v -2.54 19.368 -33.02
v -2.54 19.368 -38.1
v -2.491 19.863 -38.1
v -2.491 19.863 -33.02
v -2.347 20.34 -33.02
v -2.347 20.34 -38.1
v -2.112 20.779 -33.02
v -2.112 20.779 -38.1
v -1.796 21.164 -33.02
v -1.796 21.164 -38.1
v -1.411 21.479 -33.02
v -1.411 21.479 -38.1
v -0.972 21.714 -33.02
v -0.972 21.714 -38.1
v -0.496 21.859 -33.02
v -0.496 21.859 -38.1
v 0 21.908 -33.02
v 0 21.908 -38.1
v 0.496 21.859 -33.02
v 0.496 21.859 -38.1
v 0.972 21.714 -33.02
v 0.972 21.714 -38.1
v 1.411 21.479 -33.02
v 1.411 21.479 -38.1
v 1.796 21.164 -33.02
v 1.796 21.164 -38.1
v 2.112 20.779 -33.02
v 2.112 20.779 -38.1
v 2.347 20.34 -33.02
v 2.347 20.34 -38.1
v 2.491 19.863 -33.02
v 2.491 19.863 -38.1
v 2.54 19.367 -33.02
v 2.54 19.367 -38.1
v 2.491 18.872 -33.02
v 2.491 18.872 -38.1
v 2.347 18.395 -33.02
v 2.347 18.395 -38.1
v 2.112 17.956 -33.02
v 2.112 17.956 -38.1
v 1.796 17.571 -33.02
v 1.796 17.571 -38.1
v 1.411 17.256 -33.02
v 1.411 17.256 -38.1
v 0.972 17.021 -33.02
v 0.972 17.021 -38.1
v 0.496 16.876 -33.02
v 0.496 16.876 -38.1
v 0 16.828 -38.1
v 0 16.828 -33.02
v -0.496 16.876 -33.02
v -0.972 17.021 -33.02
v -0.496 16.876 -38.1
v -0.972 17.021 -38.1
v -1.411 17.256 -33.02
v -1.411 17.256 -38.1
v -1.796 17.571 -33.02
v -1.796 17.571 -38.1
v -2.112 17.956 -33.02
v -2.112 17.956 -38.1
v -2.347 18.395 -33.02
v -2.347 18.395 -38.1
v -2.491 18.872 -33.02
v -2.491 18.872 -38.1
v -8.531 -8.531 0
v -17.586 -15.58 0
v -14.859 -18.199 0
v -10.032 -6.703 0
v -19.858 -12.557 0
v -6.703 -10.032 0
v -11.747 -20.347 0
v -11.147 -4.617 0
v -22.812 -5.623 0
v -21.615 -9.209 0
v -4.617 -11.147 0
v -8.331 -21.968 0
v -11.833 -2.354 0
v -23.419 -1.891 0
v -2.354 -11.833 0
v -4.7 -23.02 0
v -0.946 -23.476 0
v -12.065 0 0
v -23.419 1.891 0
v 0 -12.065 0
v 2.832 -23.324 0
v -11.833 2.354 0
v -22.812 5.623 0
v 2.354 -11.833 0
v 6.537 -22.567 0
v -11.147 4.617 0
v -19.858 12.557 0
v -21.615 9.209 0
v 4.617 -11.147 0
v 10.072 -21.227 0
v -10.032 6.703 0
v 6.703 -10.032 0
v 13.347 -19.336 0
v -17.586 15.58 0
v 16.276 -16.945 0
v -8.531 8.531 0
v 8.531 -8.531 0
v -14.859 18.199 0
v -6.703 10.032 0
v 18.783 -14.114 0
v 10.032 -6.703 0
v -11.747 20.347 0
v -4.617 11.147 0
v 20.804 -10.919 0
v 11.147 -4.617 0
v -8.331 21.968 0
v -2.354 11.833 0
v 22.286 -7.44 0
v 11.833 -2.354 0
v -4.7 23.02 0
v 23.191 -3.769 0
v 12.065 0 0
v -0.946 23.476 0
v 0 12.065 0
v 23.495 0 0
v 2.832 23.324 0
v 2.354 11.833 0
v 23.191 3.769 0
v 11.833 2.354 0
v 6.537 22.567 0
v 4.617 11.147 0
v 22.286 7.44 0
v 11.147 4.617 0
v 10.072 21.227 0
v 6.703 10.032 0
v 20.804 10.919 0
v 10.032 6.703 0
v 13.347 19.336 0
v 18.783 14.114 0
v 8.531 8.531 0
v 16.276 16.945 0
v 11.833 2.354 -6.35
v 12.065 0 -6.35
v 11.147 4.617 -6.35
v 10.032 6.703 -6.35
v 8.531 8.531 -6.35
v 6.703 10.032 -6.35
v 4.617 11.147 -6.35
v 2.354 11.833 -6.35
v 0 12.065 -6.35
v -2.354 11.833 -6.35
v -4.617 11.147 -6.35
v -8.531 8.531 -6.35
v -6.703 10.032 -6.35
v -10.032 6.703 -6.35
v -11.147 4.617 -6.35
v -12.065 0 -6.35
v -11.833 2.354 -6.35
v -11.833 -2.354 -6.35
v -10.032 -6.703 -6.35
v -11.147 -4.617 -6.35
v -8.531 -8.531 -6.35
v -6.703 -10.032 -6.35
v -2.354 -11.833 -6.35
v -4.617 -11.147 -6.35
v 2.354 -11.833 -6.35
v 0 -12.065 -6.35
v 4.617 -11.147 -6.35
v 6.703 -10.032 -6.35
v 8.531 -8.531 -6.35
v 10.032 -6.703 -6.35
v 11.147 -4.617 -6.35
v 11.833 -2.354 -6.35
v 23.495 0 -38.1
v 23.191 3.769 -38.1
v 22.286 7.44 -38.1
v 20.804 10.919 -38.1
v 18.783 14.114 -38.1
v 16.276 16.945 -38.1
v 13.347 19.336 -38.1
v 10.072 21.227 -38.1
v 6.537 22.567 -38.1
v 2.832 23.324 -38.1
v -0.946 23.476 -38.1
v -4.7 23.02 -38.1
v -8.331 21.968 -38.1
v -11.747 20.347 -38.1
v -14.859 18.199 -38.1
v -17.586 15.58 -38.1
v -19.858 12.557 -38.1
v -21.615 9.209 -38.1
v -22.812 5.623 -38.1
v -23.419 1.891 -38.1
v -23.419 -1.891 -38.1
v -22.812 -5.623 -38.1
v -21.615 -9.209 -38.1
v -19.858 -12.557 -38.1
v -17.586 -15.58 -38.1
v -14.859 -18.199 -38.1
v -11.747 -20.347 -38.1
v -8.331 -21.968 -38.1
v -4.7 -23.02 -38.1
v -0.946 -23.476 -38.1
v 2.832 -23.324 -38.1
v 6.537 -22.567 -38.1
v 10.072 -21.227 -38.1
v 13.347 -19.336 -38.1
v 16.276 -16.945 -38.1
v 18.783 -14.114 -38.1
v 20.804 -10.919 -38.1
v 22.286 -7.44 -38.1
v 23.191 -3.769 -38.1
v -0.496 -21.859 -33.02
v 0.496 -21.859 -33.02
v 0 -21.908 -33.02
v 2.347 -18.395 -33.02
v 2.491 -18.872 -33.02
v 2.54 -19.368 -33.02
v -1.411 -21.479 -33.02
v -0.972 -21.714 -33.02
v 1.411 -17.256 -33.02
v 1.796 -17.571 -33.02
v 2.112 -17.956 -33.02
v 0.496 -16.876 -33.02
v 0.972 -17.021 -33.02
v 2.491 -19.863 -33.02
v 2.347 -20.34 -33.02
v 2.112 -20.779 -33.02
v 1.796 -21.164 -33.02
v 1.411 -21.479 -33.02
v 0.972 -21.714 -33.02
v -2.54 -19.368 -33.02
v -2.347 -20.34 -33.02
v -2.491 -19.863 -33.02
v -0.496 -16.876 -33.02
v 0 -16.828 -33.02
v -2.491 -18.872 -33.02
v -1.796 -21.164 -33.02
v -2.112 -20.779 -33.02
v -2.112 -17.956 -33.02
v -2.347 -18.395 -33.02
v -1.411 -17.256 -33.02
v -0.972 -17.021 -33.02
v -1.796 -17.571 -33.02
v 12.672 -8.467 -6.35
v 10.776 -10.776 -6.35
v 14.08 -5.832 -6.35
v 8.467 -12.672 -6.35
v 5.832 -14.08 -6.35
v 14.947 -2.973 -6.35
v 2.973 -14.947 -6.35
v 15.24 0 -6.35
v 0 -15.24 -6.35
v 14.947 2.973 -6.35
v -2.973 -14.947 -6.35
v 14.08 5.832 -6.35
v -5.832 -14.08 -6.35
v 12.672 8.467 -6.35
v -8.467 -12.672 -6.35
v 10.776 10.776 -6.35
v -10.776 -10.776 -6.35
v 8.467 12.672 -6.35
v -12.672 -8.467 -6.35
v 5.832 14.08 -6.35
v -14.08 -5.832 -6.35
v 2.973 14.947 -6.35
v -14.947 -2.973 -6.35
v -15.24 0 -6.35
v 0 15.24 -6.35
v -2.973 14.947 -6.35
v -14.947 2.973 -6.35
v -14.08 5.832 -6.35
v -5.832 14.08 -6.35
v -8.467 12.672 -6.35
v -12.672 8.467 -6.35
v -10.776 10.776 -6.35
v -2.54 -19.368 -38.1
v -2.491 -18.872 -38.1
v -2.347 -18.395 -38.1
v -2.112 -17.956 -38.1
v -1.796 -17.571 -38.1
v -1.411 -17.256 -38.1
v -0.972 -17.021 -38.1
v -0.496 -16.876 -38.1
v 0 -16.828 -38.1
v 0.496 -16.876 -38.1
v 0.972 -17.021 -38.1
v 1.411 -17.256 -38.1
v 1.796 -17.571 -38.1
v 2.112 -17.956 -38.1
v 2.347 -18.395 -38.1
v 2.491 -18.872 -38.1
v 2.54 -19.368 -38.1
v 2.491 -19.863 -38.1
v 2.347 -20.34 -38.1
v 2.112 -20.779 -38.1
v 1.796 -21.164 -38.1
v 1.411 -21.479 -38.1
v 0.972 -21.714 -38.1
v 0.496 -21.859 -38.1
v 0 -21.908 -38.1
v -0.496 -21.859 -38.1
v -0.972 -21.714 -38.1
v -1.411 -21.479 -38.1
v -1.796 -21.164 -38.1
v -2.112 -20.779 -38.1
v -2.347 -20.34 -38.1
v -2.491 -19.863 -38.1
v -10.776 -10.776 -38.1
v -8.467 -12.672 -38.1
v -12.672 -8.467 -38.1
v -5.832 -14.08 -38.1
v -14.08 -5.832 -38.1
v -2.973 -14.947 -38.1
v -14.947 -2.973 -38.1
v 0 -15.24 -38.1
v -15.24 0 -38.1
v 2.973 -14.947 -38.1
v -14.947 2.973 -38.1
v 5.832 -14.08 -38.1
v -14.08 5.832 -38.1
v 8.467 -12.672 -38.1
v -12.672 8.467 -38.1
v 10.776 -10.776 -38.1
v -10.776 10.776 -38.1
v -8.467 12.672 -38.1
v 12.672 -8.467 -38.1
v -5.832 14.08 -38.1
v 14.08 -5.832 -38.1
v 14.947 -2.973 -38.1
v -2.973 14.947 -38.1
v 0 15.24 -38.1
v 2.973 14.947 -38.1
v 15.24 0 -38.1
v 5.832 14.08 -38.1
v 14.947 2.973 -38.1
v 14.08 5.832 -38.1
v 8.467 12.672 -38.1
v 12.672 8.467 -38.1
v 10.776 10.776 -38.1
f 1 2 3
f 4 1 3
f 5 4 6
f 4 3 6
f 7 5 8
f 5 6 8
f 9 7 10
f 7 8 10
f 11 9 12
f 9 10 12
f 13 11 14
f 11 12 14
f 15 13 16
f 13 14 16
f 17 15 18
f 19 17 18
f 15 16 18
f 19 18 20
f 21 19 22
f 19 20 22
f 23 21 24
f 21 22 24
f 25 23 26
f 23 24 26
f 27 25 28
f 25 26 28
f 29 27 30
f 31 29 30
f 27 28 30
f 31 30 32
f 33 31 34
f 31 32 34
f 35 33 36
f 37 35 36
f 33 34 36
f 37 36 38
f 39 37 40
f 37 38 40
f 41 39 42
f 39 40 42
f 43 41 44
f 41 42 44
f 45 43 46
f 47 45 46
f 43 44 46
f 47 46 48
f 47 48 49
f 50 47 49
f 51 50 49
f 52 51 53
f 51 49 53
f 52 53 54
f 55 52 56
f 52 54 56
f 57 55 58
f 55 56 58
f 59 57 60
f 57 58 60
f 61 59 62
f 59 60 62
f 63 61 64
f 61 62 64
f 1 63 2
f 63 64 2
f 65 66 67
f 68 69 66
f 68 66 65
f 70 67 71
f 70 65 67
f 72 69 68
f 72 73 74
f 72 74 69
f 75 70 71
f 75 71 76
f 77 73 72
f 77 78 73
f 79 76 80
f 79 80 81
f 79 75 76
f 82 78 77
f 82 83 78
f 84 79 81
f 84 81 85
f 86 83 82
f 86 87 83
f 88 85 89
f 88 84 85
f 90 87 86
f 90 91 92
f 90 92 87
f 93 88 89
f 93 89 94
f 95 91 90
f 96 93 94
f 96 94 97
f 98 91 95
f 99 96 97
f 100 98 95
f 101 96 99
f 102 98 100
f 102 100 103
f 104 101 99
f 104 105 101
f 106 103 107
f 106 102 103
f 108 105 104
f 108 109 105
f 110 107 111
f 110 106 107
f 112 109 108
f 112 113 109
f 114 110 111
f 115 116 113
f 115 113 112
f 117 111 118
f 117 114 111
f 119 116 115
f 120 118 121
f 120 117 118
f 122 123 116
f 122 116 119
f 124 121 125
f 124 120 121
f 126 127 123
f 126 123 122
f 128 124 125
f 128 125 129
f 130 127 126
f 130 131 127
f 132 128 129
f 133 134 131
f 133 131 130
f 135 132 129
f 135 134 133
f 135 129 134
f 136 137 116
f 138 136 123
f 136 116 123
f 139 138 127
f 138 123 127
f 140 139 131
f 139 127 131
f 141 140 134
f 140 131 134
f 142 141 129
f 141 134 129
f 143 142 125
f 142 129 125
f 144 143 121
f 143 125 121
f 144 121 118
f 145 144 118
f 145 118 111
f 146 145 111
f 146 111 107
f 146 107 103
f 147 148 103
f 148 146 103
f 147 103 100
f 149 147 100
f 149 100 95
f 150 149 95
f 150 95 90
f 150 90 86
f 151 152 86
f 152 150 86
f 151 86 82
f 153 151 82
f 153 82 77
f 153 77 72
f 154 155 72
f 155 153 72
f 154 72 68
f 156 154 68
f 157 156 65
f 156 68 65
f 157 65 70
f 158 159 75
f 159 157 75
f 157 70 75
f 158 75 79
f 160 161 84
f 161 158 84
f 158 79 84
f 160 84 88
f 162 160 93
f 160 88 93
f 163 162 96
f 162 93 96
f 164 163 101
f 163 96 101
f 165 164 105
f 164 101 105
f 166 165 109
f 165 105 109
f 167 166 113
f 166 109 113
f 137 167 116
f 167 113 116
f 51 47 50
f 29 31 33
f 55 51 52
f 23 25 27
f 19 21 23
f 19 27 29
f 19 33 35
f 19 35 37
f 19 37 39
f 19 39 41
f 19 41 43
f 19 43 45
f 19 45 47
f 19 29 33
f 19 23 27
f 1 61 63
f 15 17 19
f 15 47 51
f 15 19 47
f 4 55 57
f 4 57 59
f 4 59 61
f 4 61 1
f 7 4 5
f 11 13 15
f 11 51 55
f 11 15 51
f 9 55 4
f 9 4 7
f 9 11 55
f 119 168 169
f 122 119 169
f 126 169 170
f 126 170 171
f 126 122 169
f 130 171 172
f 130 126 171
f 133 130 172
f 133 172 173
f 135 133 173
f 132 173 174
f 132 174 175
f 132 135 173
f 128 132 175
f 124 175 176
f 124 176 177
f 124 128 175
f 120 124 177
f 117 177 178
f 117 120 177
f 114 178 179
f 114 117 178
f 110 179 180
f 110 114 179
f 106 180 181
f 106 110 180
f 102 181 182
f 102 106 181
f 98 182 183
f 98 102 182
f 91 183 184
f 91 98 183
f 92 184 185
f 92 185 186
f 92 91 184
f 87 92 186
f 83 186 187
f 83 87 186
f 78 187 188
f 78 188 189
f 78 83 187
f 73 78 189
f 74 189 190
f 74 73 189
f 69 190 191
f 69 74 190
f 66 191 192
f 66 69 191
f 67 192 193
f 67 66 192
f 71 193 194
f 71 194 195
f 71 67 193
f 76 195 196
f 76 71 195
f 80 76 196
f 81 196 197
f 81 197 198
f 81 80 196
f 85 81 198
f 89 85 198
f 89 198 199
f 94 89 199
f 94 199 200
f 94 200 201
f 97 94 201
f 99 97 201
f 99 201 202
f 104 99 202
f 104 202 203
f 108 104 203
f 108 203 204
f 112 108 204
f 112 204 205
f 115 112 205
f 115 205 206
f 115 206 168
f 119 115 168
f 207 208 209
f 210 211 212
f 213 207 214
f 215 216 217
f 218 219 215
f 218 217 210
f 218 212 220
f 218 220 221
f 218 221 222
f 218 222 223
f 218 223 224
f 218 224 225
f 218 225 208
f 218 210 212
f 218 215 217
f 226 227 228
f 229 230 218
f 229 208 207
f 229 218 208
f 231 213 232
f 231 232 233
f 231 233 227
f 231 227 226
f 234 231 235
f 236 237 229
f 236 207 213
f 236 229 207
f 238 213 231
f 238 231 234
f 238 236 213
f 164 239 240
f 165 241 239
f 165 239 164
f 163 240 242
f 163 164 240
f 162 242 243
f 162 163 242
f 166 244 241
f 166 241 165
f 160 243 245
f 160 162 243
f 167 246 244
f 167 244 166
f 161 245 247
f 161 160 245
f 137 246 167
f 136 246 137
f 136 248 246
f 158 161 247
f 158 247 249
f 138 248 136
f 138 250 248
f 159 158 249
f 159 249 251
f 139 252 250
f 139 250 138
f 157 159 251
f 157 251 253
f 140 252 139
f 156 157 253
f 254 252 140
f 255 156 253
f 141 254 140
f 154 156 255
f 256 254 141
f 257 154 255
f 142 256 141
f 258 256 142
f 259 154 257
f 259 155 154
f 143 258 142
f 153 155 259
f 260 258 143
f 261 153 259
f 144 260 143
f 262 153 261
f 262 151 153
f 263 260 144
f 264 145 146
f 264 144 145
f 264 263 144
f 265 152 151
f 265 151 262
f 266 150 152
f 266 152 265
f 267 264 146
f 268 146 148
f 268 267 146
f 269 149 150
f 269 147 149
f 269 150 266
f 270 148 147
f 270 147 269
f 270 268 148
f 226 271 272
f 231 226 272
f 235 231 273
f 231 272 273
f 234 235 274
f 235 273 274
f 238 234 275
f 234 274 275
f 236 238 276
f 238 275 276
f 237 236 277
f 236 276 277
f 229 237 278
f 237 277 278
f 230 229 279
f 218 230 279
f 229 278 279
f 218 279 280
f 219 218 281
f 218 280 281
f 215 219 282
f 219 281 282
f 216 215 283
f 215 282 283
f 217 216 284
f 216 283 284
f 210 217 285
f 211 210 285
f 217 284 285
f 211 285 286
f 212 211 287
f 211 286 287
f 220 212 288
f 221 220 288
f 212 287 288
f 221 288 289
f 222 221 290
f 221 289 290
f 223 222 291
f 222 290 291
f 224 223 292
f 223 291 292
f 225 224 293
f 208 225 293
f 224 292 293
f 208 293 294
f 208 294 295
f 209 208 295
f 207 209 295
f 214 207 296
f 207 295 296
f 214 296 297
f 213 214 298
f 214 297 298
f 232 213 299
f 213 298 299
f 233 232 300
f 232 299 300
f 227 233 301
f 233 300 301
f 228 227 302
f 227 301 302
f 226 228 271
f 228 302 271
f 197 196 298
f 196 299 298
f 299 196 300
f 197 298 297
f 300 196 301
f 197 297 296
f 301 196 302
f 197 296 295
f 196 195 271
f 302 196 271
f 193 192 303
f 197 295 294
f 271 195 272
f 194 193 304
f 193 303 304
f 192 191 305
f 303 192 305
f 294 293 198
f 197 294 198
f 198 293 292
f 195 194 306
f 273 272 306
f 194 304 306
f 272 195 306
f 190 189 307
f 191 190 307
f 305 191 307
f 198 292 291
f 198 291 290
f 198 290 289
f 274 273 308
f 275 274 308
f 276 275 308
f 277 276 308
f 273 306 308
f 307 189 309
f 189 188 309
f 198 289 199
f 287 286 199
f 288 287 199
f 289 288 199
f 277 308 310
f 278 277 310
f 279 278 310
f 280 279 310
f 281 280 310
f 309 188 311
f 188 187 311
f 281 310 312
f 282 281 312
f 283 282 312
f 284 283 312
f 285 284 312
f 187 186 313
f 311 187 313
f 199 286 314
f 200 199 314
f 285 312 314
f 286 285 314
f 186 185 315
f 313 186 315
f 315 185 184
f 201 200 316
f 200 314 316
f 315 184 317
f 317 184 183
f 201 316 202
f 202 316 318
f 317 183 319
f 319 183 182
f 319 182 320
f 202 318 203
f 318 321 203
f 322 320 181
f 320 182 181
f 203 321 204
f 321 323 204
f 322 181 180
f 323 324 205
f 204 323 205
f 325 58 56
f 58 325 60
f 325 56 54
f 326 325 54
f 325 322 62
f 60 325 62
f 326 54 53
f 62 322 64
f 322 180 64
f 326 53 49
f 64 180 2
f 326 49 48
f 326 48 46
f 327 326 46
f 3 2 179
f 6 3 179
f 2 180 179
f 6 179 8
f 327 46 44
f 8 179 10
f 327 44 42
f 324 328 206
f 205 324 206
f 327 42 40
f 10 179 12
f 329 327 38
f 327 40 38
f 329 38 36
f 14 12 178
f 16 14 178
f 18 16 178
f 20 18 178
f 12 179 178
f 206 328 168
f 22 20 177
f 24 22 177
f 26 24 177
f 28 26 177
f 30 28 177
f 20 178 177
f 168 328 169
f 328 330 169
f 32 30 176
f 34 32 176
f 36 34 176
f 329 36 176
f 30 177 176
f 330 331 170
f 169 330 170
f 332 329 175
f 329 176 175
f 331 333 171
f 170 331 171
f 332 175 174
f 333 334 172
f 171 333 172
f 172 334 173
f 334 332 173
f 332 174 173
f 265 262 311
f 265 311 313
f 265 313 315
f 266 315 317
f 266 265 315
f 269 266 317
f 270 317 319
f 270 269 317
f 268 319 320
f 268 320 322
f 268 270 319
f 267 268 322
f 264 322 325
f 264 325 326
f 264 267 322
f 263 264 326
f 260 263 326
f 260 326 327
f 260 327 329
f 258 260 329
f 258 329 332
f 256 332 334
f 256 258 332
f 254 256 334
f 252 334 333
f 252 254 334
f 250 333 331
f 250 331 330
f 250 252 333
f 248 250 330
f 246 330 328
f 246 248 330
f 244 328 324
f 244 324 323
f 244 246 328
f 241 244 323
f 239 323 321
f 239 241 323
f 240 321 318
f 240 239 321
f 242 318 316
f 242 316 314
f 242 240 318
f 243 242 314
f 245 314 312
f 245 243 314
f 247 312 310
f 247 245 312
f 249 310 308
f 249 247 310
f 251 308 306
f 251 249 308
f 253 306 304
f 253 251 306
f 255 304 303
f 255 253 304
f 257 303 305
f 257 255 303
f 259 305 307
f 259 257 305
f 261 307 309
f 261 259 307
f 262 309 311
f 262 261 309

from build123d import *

# Parameters (mm, degrees)
SKETCH1_R           = 23.495
SKETCH1_R_2         = 12.065
BOSS_EXTRUDE1_DEPTH = 38.1
CUT_EXTRUDE1_START  = -31.75
SKETCH2_R           = 15.24
SKETCH2_R_2         = 12.065
CUT_EXTRUDE1_DEPTH  = 31.75
SKETCH4_R           = 2.54
CUT_EXTRUDE5_DEPTH  = 5.08


with BuildPart() as part:
    # Sketch1 → Boss-Extrude1 (new body)
    with BuildSketch(Plane.XY):
        Circle(SKETCH1_R)
        Circle(SKETCH1_R_2, mode=Mode.SUBTRACT)
    extrude(amount=-BOSS_EXTRUDE1_DEPTH)

    # Sketch2 → Cut-Extrude1 (cut)
    with BuildSketch(Plane(origin=(0, 0, -38.1), x_dir=(-1, 0, 0), z_dir=(0, 0, -1)).offset(CUT_EXTRUDE1_START)):
        Circle(SKETCH2_R)
        with Locations(Location((0, 0, 0), (0, 0, 180))):
            Circle(SKETCH2_R_2, mode=Mode.SUBTRACT)
    extrude(amount=CUT_EXTRUDE1_DEPTH, mode=Mode.SUBTRACT)

    # Sketch4 → Cut-Extrude5 (cut)
    with BuildSketch(Plane(origin=(0, 0, -38.1), x_dir=(-1, 0, 0), z_dir=(0, 0, -1))):
        with Locations((0, 19.3675)):
            Circle(SKETCH4_R)
        with Locations((0, -19.3675)):
            Circle(SKETCH4_R)
    extrude(amount=-CUT_EXTRUDE5_DEPTH, mode=Mode.SUBTRACT)


solid = part.part
